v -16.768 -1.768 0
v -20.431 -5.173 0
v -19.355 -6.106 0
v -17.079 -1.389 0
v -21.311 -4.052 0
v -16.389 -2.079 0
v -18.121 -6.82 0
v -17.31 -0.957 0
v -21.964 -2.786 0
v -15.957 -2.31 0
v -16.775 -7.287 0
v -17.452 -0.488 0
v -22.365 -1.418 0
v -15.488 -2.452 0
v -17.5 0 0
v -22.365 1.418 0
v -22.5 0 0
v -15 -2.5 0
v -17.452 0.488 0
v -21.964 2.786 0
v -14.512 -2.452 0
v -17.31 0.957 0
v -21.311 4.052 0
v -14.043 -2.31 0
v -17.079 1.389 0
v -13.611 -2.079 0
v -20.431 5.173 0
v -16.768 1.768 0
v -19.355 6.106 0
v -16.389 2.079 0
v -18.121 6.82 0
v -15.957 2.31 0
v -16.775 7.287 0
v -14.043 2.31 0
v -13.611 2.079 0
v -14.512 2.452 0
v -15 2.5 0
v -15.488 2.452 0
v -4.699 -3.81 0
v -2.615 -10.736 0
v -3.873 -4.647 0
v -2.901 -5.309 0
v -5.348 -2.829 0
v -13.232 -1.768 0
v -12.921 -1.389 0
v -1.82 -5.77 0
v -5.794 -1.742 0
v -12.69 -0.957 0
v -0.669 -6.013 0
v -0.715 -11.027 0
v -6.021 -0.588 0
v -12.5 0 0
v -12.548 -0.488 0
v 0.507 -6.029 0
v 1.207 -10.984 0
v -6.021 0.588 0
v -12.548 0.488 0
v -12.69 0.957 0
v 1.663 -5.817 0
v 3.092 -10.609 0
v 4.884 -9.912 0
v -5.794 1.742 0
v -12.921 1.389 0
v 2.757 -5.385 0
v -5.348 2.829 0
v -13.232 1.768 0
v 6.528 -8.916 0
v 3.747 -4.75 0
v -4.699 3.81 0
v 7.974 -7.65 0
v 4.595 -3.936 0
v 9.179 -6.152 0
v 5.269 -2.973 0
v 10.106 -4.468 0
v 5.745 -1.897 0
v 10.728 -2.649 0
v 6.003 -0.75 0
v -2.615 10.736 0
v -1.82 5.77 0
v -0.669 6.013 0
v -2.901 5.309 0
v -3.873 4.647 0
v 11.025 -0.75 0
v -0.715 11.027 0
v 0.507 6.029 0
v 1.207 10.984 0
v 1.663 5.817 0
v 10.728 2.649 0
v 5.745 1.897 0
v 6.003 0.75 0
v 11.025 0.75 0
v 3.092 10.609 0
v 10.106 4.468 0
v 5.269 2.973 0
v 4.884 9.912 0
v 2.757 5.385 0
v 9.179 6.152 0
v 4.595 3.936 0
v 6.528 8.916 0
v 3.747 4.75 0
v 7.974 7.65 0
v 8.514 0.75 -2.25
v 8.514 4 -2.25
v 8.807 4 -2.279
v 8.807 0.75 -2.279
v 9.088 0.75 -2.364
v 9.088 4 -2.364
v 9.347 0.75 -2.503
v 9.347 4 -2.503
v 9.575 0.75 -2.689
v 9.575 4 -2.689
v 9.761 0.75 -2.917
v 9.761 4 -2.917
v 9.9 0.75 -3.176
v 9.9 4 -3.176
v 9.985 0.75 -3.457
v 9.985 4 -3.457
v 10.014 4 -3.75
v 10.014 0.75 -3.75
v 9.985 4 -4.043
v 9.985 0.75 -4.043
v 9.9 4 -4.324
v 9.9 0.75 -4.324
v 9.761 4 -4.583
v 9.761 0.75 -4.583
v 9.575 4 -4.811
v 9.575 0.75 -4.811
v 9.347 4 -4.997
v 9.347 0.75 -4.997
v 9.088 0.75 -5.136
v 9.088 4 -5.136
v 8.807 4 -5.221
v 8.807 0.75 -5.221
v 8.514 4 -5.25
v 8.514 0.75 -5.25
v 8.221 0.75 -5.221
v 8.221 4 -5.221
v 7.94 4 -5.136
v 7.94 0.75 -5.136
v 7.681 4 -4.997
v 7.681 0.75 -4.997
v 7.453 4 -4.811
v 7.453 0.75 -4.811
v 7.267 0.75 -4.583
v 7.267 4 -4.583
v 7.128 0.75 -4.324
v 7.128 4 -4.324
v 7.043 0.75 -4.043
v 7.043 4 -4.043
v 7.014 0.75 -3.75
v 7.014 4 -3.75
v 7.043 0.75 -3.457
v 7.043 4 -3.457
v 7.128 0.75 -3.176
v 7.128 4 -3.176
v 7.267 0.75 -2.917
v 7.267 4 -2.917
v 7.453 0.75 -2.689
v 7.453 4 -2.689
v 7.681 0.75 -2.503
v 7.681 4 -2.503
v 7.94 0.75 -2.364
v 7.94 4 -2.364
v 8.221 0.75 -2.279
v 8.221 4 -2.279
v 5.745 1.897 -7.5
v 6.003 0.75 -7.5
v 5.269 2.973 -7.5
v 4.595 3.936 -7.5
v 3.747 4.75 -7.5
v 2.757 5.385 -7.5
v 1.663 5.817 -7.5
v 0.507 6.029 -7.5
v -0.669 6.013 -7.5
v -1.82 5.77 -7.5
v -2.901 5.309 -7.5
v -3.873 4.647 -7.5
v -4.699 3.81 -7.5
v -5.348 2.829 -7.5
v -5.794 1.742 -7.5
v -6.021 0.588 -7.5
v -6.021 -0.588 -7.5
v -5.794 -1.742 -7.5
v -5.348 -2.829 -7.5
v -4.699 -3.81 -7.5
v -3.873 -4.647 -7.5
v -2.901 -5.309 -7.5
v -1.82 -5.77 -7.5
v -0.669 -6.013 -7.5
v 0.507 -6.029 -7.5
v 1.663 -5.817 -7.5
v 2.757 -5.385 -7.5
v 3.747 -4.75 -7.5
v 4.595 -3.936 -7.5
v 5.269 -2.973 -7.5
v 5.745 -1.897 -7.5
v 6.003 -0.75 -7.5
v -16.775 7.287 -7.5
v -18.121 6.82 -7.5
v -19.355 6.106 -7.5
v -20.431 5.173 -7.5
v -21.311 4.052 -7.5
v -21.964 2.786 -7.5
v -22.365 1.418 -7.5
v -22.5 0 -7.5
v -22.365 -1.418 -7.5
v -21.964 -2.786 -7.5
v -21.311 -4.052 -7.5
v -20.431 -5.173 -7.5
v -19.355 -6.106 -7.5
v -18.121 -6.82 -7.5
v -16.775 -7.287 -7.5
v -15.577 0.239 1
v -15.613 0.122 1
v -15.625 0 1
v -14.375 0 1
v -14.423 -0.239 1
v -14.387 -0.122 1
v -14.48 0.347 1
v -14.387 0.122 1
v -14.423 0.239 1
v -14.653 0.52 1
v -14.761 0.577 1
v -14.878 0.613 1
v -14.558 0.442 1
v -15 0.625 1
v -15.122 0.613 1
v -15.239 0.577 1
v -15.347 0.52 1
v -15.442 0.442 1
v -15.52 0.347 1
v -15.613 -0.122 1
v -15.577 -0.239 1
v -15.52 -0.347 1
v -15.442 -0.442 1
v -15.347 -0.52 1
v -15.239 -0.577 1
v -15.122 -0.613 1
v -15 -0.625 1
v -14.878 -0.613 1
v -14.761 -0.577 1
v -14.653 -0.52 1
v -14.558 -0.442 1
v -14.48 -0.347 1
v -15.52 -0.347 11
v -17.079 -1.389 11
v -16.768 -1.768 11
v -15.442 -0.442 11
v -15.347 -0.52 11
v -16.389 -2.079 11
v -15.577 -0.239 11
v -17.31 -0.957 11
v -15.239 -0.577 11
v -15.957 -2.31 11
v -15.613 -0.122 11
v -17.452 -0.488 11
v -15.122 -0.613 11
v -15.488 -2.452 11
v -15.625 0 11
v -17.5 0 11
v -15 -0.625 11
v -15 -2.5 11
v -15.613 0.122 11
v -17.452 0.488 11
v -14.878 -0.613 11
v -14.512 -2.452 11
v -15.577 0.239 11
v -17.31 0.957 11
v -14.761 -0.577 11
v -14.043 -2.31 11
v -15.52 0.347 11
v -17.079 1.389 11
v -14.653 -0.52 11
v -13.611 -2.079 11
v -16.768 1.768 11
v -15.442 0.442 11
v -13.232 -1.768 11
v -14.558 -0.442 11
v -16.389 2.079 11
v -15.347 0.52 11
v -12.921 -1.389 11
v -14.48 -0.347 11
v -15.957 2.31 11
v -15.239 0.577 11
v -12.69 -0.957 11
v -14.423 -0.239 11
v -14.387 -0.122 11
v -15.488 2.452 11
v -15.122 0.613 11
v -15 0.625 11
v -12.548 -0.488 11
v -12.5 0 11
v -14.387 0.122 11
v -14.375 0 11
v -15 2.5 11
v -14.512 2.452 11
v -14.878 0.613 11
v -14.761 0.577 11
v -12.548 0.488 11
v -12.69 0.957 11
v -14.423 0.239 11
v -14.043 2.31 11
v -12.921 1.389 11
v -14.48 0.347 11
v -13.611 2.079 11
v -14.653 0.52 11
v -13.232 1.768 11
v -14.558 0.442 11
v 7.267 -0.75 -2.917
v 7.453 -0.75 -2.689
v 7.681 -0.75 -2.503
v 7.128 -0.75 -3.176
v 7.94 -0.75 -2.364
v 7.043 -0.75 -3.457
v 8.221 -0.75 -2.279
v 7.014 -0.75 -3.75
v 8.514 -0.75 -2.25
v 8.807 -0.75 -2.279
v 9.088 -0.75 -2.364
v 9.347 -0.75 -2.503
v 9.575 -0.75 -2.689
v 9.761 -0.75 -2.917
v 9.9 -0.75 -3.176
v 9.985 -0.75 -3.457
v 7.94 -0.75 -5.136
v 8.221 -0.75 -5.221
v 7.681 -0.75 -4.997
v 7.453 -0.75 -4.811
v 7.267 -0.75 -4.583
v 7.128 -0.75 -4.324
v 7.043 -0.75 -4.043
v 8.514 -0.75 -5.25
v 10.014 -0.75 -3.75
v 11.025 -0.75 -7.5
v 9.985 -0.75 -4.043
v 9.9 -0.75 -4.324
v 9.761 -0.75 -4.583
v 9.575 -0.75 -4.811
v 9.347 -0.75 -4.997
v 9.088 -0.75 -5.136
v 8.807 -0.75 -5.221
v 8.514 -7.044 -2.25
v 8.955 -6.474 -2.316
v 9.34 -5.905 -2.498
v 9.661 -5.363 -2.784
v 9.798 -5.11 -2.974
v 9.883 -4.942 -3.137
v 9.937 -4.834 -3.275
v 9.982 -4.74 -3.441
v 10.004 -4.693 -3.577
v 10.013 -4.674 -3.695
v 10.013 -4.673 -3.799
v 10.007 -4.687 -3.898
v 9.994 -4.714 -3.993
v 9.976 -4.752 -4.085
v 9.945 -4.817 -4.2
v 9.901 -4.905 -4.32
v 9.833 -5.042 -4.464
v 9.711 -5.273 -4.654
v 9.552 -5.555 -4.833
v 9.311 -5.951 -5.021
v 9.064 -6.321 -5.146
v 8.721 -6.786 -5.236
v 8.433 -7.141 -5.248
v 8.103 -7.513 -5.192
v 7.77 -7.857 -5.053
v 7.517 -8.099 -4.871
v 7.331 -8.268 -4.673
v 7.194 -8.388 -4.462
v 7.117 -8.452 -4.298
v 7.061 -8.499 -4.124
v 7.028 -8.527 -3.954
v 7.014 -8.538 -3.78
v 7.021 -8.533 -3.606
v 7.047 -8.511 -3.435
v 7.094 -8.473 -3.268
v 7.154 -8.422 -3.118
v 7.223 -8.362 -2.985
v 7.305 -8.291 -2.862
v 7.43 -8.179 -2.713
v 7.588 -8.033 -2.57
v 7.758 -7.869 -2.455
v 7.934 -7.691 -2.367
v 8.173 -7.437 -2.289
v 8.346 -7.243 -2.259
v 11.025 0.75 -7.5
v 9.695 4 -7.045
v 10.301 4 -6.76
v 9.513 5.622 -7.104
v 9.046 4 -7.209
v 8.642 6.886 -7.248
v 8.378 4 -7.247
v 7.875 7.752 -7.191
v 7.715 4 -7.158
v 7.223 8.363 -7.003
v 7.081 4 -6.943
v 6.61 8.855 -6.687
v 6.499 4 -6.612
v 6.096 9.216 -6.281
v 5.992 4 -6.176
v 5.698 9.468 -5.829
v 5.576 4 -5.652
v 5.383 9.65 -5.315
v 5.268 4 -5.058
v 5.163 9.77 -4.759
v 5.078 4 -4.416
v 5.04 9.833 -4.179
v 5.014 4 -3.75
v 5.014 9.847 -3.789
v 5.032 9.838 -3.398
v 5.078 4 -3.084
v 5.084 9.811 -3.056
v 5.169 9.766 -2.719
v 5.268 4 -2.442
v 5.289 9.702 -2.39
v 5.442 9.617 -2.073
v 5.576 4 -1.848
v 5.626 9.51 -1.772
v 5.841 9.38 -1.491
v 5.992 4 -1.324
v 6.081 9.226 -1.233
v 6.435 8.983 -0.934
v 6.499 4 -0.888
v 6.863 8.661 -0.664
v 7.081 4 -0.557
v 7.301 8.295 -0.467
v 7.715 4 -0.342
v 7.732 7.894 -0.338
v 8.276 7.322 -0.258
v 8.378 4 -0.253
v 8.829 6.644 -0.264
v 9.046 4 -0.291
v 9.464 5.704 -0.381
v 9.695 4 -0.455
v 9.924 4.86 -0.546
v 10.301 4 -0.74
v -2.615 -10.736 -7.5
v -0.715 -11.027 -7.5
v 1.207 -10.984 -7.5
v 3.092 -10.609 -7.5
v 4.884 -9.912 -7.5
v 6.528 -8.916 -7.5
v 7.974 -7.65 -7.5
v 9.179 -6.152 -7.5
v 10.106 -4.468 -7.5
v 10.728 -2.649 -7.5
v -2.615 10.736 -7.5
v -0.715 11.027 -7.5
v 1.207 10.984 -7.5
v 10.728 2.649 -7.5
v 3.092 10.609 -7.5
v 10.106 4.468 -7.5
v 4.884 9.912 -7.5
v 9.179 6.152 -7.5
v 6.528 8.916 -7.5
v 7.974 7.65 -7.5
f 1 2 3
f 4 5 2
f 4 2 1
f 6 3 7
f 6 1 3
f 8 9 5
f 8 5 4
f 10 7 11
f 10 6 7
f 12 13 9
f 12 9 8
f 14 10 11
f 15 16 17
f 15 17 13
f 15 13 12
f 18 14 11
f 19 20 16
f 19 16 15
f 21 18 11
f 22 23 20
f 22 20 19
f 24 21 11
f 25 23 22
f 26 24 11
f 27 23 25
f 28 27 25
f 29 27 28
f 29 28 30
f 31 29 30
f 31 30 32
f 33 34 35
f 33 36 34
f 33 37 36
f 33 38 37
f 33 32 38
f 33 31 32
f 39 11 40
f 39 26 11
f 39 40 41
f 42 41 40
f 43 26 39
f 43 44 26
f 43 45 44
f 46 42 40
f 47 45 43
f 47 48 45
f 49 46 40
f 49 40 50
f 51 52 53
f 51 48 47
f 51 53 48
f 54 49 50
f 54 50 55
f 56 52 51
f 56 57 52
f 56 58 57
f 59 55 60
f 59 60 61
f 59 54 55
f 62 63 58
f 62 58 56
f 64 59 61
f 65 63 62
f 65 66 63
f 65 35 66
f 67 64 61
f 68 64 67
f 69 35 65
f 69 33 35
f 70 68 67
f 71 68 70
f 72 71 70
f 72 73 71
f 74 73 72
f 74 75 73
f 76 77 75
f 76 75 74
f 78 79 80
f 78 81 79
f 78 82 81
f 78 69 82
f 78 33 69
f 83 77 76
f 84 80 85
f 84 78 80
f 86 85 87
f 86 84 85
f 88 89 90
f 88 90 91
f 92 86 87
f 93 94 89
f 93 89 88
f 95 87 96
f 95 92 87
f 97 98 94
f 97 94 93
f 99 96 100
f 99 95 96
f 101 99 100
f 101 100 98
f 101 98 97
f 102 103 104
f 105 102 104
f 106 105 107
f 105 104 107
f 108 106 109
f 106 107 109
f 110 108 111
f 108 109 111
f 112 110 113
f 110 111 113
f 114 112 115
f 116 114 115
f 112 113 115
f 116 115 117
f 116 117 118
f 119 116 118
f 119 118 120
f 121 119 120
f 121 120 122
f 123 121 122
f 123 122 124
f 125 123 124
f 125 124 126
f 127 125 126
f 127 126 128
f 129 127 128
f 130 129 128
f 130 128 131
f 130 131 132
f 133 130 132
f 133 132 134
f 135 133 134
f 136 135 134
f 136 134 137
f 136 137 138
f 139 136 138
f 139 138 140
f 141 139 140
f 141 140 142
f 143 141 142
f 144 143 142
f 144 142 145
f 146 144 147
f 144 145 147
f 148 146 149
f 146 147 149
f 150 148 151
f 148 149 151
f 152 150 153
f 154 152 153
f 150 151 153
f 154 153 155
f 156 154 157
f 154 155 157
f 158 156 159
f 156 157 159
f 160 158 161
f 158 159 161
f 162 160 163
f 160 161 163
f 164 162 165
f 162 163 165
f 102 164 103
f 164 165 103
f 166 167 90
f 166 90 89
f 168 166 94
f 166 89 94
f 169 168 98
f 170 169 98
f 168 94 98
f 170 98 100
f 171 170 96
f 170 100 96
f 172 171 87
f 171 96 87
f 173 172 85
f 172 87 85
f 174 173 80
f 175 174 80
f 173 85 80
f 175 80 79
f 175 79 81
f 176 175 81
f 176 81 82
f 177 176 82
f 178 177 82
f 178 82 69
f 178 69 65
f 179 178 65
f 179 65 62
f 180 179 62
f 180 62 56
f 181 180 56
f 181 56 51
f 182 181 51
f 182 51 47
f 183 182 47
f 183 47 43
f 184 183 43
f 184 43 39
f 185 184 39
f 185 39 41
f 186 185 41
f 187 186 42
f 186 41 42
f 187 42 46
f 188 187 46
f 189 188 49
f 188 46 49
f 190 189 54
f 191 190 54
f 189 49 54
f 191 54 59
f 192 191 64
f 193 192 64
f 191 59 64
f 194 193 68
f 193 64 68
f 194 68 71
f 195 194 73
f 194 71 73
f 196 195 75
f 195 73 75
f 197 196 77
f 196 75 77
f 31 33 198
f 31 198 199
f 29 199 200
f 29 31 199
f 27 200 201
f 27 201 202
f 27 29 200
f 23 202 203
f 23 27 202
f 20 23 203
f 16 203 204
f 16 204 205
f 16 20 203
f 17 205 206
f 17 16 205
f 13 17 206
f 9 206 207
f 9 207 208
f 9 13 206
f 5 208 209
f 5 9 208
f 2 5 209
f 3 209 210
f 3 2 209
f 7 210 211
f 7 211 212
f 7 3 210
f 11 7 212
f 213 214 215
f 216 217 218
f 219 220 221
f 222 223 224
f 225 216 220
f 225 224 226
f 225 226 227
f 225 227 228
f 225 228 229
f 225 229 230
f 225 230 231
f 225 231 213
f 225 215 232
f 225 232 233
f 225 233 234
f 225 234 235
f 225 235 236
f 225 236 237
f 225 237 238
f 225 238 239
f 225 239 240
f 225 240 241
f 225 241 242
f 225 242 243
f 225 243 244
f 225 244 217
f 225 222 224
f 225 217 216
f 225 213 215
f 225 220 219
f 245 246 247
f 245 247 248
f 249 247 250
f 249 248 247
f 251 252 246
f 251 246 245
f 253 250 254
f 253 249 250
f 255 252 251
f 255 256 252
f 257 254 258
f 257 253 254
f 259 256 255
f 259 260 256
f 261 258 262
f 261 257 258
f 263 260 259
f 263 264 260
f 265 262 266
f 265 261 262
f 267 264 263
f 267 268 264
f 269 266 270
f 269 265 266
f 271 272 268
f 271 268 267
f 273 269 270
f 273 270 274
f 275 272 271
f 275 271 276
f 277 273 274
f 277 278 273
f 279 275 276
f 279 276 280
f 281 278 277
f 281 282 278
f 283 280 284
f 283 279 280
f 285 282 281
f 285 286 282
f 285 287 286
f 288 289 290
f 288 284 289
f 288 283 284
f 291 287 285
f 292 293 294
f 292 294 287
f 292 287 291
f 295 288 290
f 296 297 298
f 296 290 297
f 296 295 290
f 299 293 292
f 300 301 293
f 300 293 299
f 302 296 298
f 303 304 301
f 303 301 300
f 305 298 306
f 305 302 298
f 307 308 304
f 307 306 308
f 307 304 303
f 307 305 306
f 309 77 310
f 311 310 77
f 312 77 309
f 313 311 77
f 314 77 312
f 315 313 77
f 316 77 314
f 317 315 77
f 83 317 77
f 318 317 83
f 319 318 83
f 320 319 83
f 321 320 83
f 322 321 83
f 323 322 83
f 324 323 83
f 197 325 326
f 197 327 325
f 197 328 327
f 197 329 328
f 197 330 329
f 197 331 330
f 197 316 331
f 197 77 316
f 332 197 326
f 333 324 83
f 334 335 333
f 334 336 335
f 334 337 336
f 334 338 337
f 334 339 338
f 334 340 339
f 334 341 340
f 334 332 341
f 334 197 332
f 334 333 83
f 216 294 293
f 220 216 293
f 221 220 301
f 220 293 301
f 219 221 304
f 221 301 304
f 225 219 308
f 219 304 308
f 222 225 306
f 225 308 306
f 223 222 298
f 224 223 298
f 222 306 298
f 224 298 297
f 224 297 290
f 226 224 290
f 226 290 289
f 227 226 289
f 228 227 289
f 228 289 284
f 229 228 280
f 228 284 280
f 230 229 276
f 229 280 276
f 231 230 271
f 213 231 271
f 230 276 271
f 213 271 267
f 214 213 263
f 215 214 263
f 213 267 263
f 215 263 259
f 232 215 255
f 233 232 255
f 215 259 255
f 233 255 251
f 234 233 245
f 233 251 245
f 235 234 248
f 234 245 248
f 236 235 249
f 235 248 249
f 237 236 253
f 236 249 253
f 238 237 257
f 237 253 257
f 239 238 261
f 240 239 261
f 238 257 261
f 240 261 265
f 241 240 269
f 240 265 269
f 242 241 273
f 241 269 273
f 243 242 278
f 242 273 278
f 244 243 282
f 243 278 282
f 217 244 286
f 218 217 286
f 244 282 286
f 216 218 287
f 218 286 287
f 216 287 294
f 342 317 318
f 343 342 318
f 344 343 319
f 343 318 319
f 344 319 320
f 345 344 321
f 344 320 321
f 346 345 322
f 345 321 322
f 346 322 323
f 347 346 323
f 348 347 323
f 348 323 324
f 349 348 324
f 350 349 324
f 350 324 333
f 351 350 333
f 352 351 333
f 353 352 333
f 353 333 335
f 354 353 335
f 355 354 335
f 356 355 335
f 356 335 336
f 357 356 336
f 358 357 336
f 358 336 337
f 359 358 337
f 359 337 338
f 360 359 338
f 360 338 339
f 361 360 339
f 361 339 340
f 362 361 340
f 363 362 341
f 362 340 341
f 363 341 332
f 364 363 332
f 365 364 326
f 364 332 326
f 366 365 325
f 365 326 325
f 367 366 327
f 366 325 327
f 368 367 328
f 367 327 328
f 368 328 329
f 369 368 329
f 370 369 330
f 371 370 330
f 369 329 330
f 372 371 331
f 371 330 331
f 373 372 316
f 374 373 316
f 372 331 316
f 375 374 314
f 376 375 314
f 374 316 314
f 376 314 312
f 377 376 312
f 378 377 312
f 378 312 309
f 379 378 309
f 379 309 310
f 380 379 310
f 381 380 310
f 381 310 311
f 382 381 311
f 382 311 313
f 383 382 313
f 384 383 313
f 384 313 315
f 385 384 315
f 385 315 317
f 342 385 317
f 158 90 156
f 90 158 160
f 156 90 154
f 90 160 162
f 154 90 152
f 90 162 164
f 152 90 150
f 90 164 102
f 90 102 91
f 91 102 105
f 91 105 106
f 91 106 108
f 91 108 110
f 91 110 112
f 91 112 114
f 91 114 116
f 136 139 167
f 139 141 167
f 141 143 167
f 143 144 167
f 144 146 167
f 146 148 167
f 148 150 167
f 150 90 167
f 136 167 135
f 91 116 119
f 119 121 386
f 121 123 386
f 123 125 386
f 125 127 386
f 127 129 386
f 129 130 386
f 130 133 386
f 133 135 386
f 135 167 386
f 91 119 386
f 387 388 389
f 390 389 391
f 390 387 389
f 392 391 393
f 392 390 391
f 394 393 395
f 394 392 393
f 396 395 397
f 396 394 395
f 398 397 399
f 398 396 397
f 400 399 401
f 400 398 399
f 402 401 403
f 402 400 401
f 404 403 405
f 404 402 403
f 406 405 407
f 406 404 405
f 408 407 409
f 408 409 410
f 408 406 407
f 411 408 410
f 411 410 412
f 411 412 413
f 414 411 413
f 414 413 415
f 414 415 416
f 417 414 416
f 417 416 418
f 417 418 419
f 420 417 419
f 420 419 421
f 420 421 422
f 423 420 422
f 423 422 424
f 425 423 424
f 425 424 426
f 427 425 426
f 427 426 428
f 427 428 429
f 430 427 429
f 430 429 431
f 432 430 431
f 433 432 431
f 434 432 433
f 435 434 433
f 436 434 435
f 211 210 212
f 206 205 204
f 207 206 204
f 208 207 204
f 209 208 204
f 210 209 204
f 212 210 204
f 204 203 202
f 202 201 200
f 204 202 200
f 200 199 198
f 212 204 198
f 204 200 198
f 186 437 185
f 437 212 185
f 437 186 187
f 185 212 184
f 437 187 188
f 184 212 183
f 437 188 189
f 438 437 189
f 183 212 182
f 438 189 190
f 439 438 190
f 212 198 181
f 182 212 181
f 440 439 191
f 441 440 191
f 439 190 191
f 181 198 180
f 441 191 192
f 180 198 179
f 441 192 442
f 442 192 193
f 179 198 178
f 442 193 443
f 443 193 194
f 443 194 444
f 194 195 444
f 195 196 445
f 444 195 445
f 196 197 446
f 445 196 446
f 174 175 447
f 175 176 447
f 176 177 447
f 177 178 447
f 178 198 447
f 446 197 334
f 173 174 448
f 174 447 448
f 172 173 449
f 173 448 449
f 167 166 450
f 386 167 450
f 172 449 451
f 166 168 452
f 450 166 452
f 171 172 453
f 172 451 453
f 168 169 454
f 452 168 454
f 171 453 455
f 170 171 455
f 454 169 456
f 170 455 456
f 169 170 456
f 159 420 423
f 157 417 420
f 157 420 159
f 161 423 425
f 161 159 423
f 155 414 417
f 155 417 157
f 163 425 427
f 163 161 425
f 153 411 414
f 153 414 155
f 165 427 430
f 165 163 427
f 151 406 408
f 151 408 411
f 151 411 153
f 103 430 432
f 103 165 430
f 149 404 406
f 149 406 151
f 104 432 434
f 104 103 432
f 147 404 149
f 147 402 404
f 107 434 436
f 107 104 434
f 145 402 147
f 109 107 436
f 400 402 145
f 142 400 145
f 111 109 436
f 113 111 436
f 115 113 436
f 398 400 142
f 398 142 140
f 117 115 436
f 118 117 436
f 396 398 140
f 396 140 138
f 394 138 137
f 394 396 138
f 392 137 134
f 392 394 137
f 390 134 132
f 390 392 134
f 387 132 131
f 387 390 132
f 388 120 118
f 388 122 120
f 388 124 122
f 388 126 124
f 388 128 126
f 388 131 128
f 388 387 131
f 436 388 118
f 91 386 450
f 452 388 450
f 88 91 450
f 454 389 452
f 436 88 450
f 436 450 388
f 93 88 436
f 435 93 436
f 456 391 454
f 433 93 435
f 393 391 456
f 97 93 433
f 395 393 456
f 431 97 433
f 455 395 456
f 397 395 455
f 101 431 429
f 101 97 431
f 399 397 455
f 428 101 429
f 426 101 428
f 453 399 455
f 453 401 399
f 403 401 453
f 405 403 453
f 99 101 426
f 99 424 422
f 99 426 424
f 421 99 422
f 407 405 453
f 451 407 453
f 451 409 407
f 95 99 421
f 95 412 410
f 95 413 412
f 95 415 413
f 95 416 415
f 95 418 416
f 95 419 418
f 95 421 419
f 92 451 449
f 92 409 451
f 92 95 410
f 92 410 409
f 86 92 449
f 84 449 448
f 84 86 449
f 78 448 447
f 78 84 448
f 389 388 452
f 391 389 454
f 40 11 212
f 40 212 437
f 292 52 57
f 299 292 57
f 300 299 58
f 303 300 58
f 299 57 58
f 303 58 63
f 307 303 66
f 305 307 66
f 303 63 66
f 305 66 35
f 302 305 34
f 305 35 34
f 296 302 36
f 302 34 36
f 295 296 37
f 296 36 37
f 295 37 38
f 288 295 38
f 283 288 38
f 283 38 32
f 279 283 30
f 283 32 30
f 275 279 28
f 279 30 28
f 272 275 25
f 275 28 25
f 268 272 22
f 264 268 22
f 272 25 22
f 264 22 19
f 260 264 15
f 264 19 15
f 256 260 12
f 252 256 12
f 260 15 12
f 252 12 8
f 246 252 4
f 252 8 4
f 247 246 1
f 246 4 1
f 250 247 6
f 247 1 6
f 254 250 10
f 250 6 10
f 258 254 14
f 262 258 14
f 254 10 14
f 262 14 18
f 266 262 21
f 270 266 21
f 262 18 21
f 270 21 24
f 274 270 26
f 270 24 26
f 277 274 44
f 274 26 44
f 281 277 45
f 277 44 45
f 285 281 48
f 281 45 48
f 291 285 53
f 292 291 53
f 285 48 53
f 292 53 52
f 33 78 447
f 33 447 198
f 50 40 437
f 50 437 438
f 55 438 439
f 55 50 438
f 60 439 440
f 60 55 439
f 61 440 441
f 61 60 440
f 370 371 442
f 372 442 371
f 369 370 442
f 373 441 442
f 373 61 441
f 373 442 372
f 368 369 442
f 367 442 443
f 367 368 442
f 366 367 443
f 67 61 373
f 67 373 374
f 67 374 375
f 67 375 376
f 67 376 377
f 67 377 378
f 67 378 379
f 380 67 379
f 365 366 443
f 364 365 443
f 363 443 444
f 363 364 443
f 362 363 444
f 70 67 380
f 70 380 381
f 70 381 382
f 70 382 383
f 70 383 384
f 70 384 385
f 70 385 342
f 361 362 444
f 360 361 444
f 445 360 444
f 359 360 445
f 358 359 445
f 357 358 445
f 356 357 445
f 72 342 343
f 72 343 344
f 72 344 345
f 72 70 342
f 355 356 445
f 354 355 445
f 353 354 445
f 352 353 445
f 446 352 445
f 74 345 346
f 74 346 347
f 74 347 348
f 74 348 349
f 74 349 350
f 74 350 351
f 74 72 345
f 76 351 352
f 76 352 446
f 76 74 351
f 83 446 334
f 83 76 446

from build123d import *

# Parameters (mm, degrees)
SKETCH1_R               = 6.05
BOSS_EXTRUDE1_DEPTH     = 7.5
SKETCH2_R               = 2.5
BOSS_EXTRUDE2_DEPTH     = 11
CUT_EXTRUDE1_DEPTH      = 0.75
CUT_EXTRUDE1_DEPTH_BACK = 0.75
SKETCH3_W               = 22.1
SKETCH3_H               = 7.5
SKETCH4_R               = 0.625
CUT_EXTRUDE2_DEPTH      = 10
SKETCH5_R               = 3.5
CUT_EXTRUDE3_DEPTH      = 30.219043448
SKETCH6_R               = 1.5
CUT_EXTRUDE4_DEPTH      = 30.219043448


with BuildPart() as part:
    # Sketch1 → Boss-Extrude1 (new body)
    with BuildSketch(Plane.XY):
        with BuildLine():
            Line((-2.615166667, 10.736079513), (-16.775, 7.286931796))
            ThreePointArc((-16.775, 7.286931796), (-22.5, 0), (-16.775, -7.286931796))
            Line((-16.775, -7.286931796), (-2.615166667, -10.736079513))
            ThreePointArc((-2.615166667, -10.736079513), (11.05, 0), (-2.615166667, 10.736079513))
        make_face()
        Circle(SKETCH1_R, mode=Mode.SUBTRACT)
    extrude(amount=-BOSS_EXTRUDE1_DEPTH)

    # Sketch2 → Boss-Extrude2 (add)
    with BuildSketch(Plane.XY):
        with Locations((-15, 0)):
            Circle(SKETCH2_R)
    extrude(amount=BOSS_EXTRUDE2_DEPTH)

    # Sketch3 → Cut-Extrude1 (cut, two sides: drawn at the far end of the back side and taken through both)
    with BuildSketch(Plane(origin=(0, 0, 0), x_dir=(1, 0, 0), z_dir=(0, 1, 0)).offset(-CUT_EXTRUDE1_DEPTH_BACK)):
        with Locations((11.05, 3.75)):
            Rectangle(SKETCH3_W, SKETCH3_H)
    extrude(amount=CUT_EXTRUDE1_DEPTH + CUT_EXTRUDE1_DEPTH_BACK, mode=Mode.SUBTRACT)

    # Sketch4 → Cut-Extrude2 (cut)
    with BuildSketch(Plane.XY.offset(11)):
        with Locations((-15, 0)):
            Circle(SKETCH4_R)
    extrude(amount=-CUT_EXTRUDE2_DEPTH, mode=Mode.SUBTRACT)

    # Sketch5 → Cut-Extrude3 (cut, through all)
    with BuildSketch(Plane(origin=(0, 4, 0), x_dir=(1, 0, 0), z_dir=(0, 1, 0))):
        with Locations((8.513925269, 3.75)):
            Circle(SKETCH5_R)
    extrude(amount=CUT_EXTRUDE3_DEPTH, mode=Mode.SUBTRACT)

    # Sketch6 → Cut-Extrude4 (cut, through all)
    with BuildSketch(Plane(origin=(0, 4, 0), x_dir=(1, 0, 0), z_dir=(0, 1, 0))):
        with Locations((8.513925269, 3.75)):
            Circle(SKETCH6_R)
    extrude(amount=-CUT_EXTRUDE4_DEPTH, mode=Mode.SUBTRACT)


solid = part.part
